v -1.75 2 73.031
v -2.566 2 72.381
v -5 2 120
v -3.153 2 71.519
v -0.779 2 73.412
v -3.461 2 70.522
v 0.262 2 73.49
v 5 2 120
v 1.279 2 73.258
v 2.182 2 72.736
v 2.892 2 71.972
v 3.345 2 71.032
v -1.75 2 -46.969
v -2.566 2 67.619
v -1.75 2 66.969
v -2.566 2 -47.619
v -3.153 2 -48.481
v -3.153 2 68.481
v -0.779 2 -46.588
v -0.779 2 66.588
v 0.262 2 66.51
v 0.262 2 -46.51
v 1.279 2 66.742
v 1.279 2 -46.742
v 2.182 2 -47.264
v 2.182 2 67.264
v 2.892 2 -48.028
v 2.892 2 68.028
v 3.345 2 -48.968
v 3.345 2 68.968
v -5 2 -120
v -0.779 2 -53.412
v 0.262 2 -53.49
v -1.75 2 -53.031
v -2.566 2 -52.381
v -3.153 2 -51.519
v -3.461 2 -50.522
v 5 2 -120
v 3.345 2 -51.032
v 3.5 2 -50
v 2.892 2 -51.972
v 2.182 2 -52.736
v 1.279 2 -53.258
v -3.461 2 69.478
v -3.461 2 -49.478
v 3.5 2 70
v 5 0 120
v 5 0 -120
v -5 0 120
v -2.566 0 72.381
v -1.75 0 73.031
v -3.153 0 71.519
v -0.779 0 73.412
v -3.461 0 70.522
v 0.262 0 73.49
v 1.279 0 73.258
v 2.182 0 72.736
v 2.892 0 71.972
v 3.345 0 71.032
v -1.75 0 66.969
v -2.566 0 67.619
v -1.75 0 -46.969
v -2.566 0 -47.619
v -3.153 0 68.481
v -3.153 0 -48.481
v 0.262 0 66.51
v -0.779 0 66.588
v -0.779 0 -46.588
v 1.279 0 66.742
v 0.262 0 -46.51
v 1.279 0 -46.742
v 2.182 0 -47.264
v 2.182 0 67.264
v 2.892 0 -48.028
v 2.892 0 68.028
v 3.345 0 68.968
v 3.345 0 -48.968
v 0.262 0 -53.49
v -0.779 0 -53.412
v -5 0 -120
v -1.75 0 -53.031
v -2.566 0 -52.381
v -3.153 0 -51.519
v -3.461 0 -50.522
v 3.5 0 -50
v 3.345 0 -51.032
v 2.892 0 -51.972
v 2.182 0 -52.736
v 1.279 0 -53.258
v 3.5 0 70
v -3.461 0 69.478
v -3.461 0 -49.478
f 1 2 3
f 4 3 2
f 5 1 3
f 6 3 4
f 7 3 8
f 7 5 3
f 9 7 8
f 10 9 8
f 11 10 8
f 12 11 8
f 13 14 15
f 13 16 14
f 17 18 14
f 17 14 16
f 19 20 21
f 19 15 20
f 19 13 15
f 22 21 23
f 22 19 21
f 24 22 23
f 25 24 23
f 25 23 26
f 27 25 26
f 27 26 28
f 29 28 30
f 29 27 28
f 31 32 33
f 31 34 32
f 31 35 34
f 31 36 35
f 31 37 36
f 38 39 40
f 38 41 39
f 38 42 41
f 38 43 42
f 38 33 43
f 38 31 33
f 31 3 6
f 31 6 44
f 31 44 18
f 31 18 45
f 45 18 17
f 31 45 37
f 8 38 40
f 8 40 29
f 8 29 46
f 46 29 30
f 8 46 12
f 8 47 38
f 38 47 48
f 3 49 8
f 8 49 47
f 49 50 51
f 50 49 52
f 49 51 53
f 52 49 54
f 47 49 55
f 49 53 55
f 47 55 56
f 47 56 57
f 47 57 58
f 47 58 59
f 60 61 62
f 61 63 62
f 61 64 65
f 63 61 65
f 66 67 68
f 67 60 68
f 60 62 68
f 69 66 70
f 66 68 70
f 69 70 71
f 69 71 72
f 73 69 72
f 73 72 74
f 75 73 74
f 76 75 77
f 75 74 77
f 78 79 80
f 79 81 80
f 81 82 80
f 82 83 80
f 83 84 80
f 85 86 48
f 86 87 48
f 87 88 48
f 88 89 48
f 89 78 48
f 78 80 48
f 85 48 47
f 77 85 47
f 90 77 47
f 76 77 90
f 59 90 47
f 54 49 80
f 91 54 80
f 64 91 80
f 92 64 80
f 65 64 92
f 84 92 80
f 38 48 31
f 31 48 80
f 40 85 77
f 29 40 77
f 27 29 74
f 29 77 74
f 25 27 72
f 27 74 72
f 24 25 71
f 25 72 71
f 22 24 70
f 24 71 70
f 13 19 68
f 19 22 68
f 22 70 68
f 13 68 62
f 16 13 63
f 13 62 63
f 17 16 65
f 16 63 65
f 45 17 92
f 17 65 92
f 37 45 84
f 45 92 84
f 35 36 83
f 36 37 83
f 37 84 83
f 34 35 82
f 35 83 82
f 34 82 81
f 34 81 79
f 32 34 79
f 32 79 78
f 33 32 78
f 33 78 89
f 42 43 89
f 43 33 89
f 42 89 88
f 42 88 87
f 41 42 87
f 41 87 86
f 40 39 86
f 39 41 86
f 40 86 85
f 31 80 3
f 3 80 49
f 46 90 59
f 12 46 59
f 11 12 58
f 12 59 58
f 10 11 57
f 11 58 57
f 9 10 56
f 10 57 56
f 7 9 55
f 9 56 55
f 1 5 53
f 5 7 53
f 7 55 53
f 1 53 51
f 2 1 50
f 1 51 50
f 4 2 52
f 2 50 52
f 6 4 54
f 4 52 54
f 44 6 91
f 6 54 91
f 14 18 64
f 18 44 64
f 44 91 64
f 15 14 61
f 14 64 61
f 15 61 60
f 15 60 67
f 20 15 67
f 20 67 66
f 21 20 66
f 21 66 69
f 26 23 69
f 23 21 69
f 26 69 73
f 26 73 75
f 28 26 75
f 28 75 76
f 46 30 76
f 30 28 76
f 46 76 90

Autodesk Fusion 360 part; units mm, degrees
sketch "Sketch1" plane through (0, 0, 0) normal (0, 1, 0) x (1, 0, 0)
  line L0 (-5, -120) -> (5, -120)
  line L1 (5, -120) -> (5, 120)
  line L2 (5, 120) -> (-5, 120)
  line L3 (-5, 120) -> (-5, -120)
  circle A0 centre (0, -70) radius 3.5
  circle A1 centre (0, 50) radius 3.5
  dimension "d1" = 240
  dimension "d3" = 7
  dimension "d4" = 7
  dimension "d5" = 120
  dimension "d6" = 120
  dimension "d7" = 50
extrude "Extrude1" add sketch "Sketch1" along normal blind 2
